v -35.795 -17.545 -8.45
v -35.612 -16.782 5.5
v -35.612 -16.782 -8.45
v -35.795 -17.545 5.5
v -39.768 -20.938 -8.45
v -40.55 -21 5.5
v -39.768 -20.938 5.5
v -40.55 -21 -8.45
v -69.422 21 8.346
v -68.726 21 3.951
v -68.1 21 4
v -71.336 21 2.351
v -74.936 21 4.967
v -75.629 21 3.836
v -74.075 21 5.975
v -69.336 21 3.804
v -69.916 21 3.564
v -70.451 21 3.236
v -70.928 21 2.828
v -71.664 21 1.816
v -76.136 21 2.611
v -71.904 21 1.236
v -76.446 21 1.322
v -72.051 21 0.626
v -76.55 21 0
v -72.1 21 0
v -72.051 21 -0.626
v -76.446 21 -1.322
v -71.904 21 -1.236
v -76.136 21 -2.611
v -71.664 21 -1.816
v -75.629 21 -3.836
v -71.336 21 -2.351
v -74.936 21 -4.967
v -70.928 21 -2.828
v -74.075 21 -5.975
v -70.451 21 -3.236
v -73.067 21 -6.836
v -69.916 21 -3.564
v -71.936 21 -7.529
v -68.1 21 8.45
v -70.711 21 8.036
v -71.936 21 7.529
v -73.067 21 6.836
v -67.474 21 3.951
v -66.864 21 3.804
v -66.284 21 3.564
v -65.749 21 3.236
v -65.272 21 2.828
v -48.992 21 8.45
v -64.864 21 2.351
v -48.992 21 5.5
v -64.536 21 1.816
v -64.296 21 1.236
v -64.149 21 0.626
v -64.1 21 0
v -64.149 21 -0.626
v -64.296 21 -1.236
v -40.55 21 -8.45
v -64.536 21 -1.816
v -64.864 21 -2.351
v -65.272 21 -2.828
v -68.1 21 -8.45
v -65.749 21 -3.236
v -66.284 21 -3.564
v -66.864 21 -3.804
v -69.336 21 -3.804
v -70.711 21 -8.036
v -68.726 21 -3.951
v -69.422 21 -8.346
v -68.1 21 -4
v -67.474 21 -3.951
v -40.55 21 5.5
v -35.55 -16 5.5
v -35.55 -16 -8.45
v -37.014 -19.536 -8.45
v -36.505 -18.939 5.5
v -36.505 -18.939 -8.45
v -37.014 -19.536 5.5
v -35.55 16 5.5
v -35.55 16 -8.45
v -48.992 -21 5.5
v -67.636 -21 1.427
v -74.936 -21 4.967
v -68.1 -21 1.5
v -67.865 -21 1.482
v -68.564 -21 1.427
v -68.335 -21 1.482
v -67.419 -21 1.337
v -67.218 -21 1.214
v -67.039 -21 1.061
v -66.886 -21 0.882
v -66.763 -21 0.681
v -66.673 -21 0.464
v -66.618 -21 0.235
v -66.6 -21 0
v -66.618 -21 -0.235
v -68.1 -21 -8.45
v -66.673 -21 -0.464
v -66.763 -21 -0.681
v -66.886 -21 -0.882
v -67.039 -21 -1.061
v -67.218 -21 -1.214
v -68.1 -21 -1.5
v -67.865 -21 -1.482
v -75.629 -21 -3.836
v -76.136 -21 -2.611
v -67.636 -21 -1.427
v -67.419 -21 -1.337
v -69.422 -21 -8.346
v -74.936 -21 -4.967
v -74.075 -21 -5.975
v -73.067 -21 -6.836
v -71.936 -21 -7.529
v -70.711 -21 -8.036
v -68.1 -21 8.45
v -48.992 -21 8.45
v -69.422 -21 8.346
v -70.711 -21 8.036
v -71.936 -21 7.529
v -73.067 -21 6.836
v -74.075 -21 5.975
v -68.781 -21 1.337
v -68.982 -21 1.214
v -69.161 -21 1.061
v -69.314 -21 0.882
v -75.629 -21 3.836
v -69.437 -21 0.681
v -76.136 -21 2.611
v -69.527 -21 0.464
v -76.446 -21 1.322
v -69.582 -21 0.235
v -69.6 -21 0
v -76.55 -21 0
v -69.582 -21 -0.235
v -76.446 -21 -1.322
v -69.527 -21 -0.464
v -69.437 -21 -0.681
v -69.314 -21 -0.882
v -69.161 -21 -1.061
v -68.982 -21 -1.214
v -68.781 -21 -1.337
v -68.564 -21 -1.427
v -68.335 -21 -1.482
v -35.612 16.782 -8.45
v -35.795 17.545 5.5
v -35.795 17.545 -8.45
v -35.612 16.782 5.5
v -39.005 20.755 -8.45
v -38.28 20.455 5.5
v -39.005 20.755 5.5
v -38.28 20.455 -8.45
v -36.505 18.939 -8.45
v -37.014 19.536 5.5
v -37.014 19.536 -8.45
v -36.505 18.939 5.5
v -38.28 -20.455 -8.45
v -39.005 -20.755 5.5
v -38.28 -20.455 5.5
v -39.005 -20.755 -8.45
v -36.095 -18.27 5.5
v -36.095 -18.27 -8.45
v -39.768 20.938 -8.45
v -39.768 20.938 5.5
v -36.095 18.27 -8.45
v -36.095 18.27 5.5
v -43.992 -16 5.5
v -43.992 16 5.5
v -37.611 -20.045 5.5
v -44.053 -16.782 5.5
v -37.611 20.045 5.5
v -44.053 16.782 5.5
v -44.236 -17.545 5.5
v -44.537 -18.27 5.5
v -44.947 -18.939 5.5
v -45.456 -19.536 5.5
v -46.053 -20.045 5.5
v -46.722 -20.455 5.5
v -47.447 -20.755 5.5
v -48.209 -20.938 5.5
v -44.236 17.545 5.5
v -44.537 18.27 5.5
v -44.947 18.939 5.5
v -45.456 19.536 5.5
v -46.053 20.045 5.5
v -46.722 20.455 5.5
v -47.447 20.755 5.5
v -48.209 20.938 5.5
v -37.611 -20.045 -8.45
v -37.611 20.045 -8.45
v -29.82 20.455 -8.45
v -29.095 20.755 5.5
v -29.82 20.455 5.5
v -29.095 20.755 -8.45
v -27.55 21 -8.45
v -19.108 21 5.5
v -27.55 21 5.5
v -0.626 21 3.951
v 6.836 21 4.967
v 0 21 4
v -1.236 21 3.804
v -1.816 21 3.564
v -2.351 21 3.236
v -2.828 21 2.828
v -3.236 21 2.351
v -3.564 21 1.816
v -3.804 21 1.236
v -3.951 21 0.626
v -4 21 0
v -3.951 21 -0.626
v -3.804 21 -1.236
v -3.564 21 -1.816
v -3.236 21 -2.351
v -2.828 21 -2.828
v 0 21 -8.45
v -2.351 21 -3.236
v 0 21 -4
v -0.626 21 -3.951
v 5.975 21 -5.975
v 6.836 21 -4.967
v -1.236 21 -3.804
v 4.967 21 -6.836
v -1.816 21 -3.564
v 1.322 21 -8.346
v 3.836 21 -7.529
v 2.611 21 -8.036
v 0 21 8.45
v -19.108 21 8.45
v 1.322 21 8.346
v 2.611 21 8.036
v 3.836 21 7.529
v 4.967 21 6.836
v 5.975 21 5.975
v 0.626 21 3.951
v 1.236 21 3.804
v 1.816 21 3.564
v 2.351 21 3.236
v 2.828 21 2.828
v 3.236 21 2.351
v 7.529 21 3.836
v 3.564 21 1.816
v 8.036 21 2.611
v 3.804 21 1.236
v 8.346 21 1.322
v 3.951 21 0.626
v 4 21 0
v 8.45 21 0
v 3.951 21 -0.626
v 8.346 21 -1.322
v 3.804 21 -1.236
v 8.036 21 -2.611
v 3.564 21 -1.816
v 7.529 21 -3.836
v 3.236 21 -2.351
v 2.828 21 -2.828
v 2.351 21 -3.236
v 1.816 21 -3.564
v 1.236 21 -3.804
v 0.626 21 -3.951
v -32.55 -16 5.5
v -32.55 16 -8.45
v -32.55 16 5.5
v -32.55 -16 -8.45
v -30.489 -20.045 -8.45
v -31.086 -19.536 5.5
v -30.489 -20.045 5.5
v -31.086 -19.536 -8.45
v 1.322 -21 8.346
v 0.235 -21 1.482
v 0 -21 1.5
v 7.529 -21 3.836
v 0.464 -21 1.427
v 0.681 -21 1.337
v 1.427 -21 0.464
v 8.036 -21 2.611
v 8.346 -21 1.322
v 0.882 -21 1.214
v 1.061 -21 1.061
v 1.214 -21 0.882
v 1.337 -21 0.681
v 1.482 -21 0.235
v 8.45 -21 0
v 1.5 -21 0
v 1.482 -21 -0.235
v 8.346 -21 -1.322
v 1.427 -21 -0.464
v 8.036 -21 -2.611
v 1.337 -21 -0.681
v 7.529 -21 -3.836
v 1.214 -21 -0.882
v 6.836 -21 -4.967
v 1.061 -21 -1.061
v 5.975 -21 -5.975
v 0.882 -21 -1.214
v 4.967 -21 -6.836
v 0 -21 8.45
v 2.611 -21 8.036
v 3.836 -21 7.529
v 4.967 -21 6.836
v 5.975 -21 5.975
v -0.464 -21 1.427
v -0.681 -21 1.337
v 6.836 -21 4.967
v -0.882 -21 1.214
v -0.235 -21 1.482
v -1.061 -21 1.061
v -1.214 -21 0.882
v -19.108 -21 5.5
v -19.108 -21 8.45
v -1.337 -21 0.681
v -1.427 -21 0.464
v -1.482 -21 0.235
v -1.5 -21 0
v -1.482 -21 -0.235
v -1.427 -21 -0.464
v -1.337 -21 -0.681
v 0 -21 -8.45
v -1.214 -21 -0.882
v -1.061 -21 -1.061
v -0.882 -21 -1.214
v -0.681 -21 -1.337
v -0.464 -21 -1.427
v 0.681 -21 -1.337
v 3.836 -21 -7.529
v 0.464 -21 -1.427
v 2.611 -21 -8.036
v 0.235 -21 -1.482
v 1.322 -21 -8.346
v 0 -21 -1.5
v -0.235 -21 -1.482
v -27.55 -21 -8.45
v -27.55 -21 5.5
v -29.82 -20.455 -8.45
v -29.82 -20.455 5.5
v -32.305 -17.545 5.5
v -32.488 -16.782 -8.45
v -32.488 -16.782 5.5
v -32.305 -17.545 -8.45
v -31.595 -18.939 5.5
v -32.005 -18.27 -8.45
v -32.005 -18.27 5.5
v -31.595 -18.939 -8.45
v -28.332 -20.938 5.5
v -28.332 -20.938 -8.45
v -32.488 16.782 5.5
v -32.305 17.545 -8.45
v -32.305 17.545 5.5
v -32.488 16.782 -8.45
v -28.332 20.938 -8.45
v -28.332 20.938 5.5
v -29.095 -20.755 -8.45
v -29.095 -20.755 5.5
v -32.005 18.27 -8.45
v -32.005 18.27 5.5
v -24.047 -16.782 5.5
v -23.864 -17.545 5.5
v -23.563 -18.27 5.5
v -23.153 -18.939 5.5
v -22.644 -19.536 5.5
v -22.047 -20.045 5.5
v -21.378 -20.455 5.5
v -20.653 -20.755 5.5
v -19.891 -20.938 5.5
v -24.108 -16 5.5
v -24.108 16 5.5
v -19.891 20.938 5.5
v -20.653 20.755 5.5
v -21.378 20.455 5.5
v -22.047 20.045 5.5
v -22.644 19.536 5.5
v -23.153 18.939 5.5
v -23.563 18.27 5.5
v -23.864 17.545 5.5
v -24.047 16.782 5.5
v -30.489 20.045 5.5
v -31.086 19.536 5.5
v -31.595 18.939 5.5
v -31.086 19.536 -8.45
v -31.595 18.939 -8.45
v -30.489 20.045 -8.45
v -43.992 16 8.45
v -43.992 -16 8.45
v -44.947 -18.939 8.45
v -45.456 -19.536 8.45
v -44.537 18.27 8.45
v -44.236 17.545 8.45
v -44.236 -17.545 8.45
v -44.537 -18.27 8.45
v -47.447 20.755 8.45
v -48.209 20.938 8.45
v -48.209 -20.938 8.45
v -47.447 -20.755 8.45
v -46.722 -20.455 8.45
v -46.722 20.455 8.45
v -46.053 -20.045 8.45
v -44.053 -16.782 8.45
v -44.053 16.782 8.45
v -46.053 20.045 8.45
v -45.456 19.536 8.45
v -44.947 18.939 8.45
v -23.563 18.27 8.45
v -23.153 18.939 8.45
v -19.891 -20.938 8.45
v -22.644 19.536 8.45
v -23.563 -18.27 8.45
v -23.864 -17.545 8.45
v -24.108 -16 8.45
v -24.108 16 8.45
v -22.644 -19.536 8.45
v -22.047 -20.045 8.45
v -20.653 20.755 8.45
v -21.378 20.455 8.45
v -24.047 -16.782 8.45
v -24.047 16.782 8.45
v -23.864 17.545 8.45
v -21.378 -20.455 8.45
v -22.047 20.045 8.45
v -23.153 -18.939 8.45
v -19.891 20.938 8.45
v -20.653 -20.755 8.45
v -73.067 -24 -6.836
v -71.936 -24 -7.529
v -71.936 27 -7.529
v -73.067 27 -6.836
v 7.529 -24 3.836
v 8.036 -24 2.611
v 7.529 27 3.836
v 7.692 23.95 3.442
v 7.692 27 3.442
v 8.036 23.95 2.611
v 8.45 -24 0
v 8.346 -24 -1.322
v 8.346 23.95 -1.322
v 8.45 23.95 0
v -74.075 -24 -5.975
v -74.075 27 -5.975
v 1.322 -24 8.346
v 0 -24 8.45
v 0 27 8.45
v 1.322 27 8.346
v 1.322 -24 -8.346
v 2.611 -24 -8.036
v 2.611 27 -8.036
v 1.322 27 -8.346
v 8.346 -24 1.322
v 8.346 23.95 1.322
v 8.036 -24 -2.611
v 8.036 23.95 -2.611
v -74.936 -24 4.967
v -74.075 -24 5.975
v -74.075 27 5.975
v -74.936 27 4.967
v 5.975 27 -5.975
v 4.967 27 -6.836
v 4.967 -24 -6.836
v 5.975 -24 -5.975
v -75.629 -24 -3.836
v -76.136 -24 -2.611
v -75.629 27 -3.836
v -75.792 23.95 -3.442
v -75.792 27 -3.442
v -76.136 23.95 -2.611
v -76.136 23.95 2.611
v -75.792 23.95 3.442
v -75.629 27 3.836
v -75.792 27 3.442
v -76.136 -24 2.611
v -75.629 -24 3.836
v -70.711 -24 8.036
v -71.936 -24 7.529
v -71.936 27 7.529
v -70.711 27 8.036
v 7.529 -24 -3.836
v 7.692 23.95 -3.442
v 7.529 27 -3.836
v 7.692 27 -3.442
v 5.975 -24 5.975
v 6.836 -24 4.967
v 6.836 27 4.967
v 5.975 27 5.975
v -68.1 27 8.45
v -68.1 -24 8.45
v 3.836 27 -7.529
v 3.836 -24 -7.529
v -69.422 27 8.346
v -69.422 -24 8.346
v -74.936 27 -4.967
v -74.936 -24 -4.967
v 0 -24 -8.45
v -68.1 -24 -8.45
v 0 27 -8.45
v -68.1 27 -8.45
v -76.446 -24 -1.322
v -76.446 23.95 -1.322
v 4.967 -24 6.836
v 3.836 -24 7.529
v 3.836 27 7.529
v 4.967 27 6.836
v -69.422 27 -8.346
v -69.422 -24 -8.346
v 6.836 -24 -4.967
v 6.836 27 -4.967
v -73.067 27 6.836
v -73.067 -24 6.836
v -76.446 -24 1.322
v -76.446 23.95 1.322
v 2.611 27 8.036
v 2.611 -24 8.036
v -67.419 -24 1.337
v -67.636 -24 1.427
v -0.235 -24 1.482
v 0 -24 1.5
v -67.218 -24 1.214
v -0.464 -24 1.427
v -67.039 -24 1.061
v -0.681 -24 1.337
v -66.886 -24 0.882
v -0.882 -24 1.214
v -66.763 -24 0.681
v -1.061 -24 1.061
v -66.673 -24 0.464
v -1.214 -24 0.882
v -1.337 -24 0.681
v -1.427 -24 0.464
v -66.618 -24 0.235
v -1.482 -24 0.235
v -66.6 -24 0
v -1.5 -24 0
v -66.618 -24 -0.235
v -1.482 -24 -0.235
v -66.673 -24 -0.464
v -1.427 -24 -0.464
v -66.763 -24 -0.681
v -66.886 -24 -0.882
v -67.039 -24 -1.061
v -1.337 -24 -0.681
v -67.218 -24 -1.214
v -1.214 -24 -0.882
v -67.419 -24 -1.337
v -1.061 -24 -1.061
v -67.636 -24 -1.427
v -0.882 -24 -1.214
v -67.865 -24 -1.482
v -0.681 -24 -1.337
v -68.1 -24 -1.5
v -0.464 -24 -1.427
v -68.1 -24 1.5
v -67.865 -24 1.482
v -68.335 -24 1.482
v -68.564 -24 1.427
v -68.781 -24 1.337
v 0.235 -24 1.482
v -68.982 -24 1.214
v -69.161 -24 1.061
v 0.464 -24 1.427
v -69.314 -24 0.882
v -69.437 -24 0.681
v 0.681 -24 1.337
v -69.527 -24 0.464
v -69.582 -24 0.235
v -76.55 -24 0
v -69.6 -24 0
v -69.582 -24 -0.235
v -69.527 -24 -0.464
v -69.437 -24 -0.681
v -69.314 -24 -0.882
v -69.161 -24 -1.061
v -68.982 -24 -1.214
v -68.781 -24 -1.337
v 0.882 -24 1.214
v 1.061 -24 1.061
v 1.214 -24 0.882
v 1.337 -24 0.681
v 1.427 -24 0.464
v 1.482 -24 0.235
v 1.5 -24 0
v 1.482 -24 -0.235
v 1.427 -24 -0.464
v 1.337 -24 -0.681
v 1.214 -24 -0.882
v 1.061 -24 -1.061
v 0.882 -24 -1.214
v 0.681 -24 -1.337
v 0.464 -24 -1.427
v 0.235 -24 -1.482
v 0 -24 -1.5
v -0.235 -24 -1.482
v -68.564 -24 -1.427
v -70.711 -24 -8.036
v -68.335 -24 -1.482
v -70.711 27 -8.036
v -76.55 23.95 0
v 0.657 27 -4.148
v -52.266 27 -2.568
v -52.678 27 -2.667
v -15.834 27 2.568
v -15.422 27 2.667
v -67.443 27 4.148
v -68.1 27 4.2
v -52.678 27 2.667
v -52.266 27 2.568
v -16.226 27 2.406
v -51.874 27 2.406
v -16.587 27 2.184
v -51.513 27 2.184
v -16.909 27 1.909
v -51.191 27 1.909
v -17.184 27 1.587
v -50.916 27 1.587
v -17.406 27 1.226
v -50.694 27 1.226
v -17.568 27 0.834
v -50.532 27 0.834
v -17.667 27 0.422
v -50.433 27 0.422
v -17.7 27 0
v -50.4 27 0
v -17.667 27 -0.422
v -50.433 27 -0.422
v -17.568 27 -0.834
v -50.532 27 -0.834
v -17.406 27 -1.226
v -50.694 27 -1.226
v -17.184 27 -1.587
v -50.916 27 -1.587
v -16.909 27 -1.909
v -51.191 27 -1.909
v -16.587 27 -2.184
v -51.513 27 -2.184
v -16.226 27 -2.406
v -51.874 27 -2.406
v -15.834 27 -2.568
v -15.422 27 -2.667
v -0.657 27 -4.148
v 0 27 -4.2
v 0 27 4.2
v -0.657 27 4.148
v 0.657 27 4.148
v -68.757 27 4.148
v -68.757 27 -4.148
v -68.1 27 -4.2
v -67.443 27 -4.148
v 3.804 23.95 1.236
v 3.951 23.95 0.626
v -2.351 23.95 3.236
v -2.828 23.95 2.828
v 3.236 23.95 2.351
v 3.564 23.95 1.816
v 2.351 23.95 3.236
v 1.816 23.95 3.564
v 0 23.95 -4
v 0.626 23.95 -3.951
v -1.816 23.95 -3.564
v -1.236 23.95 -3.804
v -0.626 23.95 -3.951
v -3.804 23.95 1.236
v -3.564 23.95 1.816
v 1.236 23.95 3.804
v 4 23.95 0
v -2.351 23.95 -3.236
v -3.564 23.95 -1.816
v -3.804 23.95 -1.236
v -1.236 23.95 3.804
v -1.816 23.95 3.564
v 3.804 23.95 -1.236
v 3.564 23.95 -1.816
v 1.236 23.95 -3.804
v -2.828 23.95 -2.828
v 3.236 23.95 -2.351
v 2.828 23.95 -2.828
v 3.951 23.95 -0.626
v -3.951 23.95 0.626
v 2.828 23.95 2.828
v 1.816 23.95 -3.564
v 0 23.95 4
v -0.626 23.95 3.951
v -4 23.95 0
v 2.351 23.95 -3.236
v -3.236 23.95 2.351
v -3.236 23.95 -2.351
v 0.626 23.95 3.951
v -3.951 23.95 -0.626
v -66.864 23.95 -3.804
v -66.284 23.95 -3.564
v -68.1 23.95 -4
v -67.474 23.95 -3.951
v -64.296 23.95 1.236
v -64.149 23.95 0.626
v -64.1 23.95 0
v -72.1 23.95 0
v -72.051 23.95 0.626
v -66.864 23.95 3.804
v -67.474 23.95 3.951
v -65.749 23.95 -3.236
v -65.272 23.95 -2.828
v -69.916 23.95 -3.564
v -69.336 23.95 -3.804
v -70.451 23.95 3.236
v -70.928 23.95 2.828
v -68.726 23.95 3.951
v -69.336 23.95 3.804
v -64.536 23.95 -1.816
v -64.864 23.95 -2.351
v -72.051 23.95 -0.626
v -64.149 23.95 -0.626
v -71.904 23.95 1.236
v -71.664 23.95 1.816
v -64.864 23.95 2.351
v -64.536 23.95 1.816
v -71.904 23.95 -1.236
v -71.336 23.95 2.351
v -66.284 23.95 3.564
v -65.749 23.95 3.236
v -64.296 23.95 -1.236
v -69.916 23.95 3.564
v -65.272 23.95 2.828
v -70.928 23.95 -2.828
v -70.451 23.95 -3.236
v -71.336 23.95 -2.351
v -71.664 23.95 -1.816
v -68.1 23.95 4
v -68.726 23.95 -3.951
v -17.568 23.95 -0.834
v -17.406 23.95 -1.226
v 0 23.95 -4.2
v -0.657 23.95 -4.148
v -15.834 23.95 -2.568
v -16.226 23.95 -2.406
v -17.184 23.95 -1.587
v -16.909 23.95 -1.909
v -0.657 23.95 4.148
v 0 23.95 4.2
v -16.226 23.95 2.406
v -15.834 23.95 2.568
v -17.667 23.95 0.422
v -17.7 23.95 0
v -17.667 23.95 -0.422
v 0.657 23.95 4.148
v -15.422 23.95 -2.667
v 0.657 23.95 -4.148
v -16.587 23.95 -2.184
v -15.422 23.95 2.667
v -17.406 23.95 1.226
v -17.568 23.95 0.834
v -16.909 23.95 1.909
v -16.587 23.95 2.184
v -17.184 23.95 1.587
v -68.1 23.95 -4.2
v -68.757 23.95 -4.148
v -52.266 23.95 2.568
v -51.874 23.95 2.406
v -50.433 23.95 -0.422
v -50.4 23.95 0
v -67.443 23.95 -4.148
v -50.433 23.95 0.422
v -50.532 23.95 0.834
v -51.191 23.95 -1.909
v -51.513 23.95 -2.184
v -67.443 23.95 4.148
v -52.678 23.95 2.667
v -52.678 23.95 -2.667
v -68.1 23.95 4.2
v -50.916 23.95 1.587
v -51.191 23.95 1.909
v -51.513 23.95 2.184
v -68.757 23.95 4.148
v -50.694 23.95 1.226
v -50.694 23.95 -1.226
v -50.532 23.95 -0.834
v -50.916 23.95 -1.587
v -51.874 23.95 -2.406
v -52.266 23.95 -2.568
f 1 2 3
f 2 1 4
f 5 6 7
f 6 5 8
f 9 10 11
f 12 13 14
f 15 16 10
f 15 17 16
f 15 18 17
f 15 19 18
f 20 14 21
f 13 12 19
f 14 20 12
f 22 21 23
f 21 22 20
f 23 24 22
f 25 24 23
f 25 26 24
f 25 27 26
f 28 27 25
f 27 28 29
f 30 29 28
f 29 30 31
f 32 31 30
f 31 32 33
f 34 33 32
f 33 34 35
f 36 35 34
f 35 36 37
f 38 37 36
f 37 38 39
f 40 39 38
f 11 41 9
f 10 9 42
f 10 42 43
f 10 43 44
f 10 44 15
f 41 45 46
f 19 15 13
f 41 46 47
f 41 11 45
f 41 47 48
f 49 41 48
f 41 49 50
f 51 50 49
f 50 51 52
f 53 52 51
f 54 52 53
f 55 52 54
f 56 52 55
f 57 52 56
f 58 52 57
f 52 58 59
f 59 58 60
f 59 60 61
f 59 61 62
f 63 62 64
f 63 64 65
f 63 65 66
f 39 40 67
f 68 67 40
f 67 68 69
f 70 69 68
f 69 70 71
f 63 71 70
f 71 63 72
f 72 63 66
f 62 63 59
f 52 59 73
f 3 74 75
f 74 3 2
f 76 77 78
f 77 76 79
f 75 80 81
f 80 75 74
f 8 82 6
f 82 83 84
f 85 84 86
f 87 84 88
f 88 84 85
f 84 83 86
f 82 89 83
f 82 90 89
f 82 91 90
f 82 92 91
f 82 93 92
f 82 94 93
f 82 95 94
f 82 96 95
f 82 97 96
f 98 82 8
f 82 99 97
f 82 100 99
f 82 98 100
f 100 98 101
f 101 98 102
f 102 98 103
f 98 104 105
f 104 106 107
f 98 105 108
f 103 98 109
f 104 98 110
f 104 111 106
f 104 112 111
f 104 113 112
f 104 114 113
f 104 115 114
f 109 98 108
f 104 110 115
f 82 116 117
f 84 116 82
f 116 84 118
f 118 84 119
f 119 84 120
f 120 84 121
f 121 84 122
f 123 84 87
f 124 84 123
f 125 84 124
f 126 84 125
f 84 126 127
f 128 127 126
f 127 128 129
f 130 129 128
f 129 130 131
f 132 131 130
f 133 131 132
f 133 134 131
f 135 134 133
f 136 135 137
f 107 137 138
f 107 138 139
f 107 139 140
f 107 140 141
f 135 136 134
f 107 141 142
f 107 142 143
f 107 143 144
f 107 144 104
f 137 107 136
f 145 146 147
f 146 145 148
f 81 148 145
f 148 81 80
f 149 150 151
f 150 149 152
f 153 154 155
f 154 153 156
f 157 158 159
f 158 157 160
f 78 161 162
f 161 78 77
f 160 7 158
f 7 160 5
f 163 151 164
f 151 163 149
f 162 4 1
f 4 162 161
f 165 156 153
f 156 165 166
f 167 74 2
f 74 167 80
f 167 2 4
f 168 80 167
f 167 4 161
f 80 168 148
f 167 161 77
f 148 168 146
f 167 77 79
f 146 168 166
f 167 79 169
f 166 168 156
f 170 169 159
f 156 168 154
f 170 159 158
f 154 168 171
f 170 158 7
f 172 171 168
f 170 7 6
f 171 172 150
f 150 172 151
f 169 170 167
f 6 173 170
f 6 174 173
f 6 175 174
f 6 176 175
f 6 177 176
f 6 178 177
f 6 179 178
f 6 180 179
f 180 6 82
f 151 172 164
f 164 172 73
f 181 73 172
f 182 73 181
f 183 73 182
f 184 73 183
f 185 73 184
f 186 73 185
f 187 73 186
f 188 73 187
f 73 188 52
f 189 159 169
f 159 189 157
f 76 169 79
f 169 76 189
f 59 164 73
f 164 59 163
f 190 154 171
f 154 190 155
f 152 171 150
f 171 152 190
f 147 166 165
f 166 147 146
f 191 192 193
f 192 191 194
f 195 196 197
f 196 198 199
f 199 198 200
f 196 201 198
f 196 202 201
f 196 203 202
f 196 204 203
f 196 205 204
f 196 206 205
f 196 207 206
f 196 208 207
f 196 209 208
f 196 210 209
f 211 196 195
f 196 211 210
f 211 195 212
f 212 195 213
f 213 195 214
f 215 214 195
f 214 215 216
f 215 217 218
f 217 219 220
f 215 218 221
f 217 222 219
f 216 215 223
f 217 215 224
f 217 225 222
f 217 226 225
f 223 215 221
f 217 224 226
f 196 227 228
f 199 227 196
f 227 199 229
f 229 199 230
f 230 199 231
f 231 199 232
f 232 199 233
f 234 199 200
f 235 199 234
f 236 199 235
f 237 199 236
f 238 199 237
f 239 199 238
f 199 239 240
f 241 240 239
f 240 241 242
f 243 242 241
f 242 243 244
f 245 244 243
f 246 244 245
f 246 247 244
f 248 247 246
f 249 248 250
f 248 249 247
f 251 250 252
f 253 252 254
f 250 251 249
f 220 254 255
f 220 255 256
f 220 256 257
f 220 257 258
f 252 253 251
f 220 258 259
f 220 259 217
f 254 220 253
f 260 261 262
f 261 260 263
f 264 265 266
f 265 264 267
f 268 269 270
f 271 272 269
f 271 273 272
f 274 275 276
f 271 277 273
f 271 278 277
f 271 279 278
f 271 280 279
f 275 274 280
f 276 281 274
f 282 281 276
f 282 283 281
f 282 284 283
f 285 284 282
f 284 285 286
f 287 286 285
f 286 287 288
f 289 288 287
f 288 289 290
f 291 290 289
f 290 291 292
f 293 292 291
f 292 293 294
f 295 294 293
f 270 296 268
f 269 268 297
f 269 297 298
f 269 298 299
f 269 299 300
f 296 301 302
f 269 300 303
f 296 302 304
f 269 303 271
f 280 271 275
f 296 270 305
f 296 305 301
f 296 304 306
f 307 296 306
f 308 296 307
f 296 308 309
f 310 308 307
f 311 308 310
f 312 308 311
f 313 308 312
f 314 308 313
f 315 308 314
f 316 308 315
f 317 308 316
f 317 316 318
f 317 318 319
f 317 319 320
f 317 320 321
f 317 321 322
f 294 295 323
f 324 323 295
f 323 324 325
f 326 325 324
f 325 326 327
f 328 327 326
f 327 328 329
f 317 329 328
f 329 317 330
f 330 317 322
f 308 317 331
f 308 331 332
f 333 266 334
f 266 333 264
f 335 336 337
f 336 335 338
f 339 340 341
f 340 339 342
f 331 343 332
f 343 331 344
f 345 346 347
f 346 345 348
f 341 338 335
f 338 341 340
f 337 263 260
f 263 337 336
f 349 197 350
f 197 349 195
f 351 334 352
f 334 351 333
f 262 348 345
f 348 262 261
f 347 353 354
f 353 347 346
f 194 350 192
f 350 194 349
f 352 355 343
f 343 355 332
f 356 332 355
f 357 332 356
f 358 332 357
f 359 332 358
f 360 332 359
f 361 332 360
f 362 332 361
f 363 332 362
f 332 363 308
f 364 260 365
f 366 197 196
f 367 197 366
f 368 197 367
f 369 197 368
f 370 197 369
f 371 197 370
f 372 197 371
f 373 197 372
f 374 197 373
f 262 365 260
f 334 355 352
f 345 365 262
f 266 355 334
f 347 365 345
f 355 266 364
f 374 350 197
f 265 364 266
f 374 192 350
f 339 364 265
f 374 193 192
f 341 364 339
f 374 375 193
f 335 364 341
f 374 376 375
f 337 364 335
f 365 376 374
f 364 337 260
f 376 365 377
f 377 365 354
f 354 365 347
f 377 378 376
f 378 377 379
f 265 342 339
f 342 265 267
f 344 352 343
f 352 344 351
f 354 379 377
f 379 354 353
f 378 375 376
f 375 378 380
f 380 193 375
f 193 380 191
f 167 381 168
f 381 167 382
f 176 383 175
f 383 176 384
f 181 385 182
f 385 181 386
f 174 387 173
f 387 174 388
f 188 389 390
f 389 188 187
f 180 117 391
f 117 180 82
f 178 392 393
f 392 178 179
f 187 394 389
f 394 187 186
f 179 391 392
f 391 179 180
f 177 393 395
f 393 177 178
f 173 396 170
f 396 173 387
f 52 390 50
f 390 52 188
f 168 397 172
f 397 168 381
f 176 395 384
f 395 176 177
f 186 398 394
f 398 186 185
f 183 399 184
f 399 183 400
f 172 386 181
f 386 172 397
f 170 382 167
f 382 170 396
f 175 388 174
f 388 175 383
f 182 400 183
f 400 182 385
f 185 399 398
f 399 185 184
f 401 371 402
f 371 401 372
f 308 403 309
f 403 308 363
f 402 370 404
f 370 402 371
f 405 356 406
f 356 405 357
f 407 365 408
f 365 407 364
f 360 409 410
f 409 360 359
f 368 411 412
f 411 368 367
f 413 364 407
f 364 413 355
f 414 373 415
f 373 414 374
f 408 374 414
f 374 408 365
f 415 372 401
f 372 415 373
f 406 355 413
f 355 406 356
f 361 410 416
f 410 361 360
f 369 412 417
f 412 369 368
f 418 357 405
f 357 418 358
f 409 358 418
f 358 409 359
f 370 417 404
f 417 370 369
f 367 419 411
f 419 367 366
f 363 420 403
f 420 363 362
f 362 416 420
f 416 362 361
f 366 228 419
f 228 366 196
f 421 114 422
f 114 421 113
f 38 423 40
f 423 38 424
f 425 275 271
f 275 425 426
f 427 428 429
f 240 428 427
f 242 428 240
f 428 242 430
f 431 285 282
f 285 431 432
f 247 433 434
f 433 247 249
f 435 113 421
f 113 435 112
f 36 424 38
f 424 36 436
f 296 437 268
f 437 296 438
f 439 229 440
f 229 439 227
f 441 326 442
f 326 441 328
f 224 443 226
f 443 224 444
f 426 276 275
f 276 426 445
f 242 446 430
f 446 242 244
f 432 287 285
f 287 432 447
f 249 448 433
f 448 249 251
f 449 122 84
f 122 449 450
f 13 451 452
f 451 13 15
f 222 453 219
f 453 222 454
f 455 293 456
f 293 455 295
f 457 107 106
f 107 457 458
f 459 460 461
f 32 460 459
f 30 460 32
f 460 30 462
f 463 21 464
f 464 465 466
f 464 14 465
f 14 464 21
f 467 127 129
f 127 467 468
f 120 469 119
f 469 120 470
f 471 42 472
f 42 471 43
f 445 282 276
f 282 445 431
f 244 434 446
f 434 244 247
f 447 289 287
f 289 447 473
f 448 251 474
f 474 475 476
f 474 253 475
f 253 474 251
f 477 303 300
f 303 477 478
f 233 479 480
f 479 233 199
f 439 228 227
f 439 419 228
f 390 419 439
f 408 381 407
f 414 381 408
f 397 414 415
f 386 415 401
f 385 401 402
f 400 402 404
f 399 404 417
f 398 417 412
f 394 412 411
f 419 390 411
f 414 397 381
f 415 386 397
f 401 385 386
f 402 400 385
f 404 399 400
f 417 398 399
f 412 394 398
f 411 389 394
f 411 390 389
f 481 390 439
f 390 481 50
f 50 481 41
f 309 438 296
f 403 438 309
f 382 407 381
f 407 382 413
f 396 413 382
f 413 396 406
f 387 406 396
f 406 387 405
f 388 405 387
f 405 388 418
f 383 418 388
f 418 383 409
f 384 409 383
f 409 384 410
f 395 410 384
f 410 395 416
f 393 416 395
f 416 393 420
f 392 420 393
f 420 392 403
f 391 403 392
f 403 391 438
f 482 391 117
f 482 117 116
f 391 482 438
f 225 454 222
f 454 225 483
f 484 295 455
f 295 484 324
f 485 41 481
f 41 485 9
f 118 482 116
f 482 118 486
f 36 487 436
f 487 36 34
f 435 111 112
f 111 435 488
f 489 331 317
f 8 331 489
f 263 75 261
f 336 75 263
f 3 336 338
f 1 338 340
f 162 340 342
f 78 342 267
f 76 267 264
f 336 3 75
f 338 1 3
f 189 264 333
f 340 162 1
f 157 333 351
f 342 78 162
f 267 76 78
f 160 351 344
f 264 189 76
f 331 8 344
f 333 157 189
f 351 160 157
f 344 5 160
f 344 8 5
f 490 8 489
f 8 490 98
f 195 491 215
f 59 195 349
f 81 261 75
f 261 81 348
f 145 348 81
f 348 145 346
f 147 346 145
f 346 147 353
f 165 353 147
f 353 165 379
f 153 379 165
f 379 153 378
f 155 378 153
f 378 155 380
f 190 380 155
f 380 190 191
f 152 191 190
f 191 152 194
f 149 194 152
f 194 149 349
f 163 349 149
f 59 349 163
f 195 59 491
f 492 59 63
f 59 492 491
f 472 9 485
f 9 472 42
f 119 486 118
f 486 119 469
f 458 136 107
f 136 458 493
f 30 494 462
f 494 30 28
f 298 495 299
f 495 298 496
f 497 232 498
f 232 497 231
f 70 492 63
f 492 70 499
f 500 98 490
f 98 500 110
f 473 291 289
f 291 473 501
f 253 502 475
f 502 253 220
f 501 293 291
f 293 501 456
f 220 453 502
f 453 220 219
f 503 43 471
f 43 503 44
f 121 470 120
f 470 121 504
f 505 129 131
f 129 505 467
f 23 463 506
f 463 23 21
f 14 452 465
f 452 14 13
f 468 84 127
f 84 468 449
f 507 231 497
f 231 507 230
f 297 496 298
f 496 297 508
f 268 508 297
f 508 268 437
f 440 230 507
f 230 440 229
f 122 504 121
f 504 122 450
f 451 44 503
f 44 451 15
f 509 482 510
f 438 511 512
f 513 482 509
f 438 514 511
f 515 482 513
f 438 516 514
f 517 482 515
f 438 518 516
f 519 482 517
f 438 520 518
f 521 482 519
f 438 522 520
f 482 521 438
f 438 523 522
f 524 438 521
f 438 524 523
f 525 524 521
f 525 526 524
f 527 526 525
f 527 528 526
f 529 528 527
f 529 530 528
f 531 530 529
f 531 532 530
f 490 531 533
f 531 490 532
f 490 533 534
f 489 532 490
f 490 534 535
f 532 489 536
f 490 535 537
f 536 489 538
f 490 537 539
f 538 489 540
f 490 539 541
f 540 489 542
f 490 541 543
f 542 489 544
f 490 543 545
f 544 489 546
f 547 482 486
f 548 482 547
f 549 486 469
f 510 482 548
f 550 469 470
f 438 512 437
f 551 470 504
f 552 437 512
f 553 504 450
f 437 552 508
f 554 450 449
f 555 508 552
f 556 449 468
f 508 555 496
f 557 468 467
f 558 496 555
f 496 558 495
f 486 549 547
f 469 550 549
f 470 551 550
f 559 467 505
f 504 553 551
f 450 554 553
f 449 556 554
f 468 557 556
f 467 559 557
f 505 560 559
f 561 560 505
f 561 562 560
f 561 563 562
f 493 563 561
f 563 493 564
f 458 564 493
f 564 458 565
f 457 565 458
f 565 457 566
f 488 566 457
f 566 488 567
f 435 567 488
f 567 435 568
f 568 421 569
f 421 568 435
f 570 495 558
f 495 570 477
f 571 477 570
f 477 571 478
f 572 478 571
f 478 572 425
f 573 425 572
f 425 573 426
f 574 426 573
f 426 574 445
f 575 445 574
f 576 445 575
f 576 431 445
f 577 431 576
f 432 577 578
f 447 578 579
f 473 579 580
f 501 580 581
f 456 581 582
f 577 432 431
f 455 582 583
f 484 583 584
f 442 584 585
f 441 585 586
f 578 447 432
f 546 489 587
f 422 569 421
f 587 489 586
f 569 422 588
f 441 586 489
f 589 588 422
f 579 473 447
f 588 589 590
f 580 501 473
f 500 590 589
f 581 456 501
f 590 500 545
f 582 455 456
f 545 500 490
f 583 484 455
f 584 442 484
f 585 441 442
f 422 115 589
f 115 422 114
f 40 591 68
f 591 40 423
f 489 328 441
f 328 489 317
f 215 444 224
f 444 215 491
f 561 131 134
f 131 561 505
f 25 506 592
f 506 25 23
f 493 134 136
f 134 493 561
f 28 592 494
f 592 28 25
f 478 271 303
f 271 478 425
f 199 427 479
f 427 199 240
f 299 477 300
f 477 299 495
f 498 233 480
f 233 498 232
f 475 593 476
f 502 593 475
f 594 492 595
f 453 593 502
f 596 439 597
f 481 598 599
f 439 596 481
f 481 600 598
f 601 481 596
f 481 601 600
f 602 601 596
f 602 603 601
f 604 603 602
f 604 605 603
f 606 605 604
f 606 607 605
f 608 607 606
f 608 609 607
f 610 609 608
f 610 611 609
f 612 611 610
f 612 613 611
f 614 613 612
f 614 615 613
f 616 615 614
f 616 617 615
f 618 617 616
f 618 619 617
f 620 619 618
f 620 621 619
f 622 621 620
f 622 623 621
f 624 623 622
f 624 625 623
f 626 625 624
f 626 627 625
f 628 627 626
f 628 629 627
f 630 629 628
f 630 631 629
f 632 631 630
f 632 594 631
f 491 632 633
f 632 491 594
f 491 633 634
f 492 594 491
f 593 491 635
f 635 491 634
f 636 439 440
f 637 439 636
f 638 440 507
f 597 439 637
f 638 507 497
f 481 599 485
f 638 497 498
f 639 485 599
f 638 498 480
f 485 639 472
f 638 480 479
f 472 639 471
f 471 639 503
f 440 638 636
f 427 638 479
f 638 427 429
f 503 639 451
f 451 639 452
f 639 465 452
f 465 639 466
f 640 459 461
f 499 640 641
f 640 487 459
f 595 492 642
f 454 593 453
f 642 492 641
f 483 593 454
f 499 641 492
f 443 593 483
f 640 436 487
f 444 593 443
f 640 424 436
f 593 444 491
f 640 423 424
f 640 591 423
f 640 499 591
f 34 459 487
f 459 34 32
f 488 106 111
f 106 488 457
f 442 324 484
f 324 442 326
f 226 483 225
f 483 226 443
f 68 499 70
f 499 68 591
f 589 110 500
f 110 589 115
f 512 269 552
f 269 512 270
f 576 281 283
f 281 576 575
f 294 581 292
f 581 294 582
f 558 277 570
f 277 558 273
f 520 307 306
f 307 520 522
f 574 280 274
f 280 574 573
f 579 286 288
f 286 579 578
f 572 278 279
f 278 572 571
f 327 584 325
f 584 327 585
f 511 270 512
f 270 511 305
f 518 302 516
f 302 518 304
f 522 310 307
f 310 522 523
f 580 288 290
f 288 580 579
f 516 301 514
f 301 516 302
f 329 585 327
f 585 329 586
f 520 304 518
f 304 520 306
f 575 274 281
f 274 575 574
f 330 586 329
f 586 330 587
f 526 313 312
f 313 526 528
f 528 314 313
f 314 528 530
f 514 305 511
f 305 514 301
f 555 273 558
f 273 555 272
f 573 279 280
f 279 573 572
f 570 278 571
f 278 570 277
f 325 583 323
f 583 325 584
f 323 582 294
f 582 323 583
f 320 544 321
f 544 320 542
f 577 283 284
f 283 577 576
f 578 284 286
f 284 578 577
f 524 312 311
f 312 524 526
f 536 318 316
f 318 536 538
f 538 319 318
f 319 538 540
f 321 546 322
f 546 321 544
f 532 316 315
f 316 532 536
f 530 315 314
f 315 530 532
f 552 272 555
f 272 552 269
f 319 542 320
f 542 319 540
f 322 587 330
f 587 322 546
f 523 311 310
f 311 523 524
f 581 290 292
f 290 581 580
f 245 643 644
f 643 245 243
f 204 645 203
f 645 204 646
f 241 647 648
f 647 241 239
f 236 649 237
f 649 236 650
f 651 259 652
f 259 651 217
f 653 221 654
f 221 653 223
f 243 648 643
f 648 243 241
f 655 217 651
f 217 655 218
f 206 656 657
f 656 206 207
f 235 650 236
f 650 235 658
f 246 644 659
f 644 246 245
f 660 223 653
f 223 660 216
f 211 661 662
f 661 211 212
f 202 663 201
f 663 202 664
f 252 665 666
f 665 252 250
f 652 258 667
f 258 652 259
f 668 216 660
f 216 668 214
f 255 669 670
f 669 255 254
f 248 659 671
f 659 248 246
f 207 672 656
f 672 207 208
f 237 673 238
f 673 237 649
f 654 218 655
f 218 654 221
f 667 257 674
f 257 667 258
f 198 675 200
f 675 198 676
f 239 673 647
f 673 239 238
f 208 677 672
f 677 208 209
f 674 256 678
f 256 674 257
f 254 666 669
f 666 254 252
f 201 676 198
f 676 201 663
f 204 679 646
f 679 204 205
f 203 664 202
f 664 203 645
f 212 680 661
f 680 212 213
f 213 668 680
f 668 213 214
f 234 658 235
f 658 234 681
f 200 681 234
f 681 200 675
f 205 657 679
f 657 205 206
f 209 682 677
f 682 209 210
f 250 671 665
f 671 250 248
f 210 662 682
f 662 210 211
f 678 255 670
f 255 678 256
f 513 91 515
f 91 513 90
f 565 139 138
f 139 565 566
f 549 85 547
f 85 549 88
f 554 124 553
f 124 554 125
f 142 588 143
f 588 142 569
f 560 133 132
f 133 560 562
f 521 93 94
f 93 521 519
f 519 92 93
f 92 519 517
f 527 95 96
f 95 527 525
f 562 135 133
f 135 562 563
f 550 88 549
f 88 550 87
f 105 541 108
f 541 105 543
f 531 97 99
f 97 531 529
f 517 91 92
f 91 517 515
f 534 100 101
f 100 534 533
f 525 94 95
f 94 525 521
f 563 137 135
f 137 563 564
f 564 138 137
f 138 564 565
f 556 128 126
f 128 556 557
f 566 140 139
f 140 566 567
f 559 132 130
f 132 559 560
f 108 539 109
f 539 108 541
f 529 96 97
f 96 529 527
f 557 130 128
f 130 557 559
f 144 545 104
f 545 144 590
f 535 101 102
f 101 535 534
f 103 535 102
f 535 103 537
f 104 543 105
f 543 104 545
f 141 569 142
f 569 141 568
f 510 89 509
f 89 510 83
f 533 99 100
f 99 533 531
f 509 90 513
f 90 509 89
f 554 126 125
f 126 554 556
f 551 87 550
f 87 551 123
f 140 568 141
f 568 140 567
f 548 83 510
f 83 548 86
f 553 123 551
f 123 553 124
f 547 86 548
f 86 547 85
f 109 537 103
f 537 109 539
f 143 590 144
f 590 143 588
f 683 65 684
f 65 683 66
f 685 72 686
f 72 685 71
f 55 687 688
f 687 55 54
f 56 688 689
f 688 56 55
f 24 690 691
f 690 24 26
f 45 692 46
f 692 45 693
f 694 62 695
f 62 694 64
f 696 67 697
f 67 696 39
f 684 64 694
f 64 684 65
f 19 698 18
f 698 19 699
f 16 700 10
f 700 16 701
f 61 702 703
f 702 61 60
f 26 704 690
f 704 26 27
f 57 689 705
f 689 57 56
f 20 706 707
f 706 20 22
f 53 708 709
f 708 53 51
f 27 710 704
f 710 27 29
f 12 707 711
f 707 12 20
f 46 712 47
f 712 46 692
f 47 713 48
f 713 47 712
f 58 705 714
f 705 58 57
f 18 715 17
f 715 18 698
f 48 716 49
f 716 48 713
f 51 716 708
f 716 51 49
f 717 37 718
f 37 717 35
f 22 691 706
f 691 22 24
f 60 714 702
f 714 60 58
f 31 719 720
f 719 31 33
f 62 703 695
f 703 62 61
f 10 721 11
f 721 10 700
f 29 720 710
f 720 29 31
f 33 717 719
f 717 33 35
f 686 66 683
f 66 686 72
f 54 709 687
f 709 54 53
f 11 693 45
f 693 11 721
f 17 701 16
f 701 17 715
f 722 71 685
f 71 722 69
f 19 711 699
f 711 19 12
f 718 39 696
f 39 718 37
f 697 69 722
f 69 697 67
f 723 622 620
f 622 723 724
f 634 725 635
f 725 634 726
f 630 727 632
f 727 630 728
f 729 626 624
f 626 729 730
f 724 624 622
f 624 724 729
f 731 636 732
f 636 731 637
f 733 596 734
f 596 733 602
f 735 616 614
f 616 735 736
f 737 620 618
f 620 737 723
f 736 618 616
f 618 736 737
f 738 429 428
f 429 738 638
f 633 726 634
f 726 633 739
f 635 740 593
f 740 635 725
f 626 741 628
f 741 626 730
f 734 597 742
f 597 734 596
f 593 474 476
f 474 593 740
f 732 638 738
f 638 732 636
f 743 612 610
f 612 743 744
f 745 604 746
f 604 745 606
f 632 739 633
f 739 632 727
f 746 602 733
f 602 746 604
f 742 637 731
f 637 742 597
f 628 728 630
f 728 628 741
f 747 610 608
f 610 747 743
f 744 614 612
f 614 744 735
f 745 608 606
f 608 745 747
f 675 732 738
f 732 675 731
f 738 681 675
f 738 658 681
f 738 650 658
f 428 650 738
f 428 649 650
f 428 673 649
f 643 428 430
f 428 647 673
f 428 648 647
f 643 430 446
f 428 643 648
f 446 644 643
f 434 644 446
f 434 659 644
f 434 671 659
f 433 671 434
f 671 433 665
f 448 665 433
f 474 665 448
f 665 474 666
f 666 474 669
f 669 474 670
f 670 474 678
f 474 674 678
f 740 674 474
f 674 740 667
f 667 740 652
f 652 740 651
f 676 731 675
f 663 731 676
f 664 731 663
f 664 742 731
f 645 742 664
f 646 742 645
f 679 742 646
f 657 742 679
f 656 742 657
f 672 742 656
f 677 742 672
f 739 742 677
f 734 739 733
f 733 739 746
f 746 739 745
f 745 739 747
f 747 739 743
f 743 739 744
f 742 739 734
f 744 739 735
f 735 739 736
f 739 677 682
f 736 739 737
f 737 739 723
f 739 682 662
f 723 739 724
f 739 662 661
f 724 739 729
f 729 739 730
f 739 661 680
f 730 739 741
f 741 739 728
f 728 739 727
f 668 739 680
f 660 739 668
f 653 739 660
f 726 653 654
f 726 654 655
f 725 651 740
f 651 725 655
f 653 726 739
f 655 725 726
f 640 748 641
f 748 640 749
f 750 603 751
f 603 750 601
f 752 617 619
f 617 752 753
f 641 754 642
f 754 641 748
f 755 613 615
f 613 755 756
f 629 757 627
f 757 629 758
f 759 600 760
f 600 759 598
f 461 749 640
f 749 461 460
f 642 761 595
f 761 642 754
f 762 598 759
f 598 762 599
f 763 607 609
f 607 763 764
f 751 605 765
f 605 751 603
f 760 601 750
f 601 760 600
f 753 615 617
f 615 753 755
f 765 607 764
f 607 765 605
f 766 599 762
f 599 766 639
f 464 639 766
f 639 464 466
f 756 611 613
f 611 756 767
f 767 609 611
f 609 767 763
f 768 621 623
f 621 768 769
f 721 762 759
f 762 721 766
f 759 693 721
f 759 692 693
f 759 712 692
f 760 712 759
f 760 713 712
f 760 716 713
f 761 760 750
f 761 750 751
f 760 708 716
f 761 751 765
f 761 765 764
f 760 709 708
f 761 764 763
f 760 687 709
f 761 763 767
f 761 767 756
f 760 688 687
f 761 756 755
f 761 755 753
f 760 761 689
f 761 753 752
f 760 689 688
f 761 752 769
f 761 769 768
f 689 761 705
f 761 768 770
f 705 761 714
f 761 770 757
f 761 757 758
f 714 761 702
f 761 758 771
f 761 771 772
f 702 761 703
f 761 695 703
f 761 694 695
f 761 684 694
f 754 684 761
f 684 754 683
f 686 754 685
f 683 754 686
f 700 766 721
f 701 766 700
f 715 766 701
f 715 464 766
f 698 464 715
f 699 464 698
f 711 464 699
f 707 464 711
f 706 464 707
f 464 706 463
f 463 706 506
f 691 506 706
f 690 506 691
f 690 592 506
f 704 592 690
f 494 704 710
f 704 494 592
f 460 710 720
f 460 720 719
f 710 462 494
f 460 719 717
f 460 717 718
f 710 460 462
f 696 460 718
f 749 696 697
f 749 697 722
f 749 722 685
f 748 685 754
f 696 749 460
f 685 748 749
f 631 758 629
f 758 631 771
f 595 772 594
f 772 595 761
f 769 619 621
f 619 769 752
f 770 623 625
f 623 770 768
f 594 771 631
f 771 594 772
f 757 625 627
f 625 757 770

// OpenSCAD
// file: utils.scad
m3Radius = 3.0/2;
m3CskTopRadius = 6.0/2;
m3CskHeadHeight = 2.0;
m8Radius = 8.0/2;

// TODO - This should take a vector, and a "center" option so it can be easily re-used
module roundedCube(_x,_y,_z,_r) {
	hull() {
		for(xPos = [-(_x/2-_r),(_x/2-_r)]) {
			for(yPos = [-(_y/2-_r),(_y/2-_r)]) {
				translate([xPos, yPos, -_z/2]) cylinder(h=_z,r=_r);
			}
		}
	}
}

// TODO - Test that this results in correctly sized bolt
module m3CskBolt(length) {
	# union() {
	// Countersunk section // TODO - how tall is the countersunk section
		translate([0,0,m3CskHeadHeight / 2]) cylinder(h=m3CskHeadHeight, r1=m3CskTopRadius, r2=m3Radius, center=true);
		translate([0,0,m3CskHeadHeight / 2 + length / 2]) cylinder(h=length, r=m3Radius, center=true);
	}
}
// file: MiniServo.scad
$fn=40;

// All dimensions in mm

// Overall dimensions of servo (excluding mounting tabs and axle shroud
servoHeight = 32.0;
servoWidth = 35.0;
servoDepth = 16.9;

// Additional dimensions for mounting tabs
mountingTabWidth = 50.8;
mountingTabHeight = 3.5;

// Axle shroud dimensions
axleShroudHeight = 3.0;
axleShroudDiameter = servoDepth;
// Align outside of shroud with main body of servo
axleXOffset = servoWidth / 2 - axleShroudDiameter / 2;

// Axle dimensions
axleDiameter = 6.0;
axleHeight = 4.0;  // Above Shroud

gearShroudXOffset = axleXOffset - 10.0;
gearShroudDiameter = 8.0;

// Rectangular pockets for mounting holes
mountingHolePocketWidth = 7.7;
mountingHolePocketDepth = 6.6;
mountingHolePocketHeight = 1.0;

// Gap between outer edge and pockets
mountingHolePocketInset = 1.3;

mhX = mountingTabWidth / 2 - mountingHolePocketWidth / 2;
mhY = servoDepth / 2 - mountingHolePocketDepth / 2 - mountingHolePocketInset;

mountingHoleDiameter = 4.0;
mountingHoleCutoutWidth = 2.0;

function signum(x) = (x < 0)?-1:(x > 0)?1:0;

module servoBody() {
  union() {
	  // The main body of the servo
		cube([servoWidth, servoHeight, servoDepth], center=true);
		
		// The mounting tabs either side
		translate([0, servoHeight / 2 - mountingTabHeight / 2, 0]) {
			cube([mountingTabWidth, mountingTabHeight, servoDepth], center=true);
		}
	}
}

module axleAndGearShroud(height, yOffset) {
	union() {
		translate([-axleXOffset, yOffset + height / 2, 0]){
			rotate([90,0,0]) {
				cylinder(height, axleShroudDiameter/2, axleShroudDiameter/2,center=true);
			}
		}
		translate([-gearShroudXOffset, yOffset+ height / 2, 0]){
			union() {
				rotate([90,0,0]) {
					cylinder(height, gearShroudDiameter/2, gearShroudDiameter/2,center=true);
				}
				translate([-gearShroudDiameter/2,0,0]) cube([gearShroudDiameter, height, gearShroudDiameter], center=true);
			}
		}
	}
}

module axle() {
  translate([-axleXOffset, servoHeight / 2 + axleShroudHeight + axleHeight / 2, 0]){
		rotate([90,0,0]) {
			cylinder(axleHeight, axleDiameter/2, axleDiameter/2,center=true);
		}
	}
}

module mountingDetail() {
	for(x = [-mhX, mhX]) {
		for(z = [-mhY, mhY]) {
			translate([x, servoHeight / 2 - mountingHolePocketHeight / 2, z]) {
				union() {
					// Rectangular pocket
					cube([mountingHolePocketWidth, mountingHolePocketHeight, mountingHolePocketDepth], center=true);

					// Actual mounting hole
					rotate([90,0,0]) cylinder(mountingTabHeight * 2, mountingHoleDiameter / 2, mountingHoleDiameter / 2, center=true);

					// Cutout to edge
					translate([signum(x) * mountingHolePocketWidth / 2, 0, 0]) cube([mountingHolePocketWidth, mountingTabHeight * 2,mountingHoleCutoutWidth], center=true);
				}
			}
		}
	}
}

module mountingBoltHoles(height, yOffset, radius) {
	for(x = [-mhX, mhX]) {
		for(z = [-mhY, mhY]) {
			translate([x, yOffset, z]) {
					// Actual mounting hole
					rotate([90,0,0]) cylinder(height, r=radius, center=true);
			}
		}
	}
}

// Main routine
module MiniServo() {
	difference() {
		union() {
			servoBody();
			axleAndGearShroud(axleShroudHeight, servoHeight / 2);
			axle();
		}

		union() {
			mountingDetail();
			mountingBoltHoles(mountingTabHeight * 2, servoHeight / 2 - mountingHolePocketHeight / 2, mountingHoleDiameter / 2);
		}
	}
}

//MiniServo();
// file: Shin.scad
include <MiniServo.scad>
include <utils.scad>

$fn=40;

// All dimensions in mm
wallThickness = 3;
wallThicknessEitherSide = 2 * wallThickness;

innerSizeTolerance = 0.4;
differencePadding = 0.1;

shinTopLength = mountingTabWidth + wallThicknessEitherSide;
shinBottomLength = 65;

footRadius = 5;
footCutoutOffset = 20;
footCutoutTopOffset = 5;
footCutoutBottomRadius = 3;

filletRadius = 2;

cutoutHeight = servoDepth + wallThicknessEitherSide + differencePadding;

module axleGearShroud() {
	union() {
		axleShroud();
		gearShroud();
	}
}

// Hole opposite axle that will be used for a pin that the thigh will rotate on

module cutoutAxleExtensionHole() {
	translate([-axleXOffset, -(servoHeight / 2), 0]){
		rotate([90,0,0]) {
			m3CskBolt(8);
		}
	}
}

module cutoutCableExtensionHole() {
	translate([-(shinTopLength / 2 - wallThickness / 2), 0, 0]) 
		rotate([0,90,0])
			roundedCube(12, 3, (wallThickness + differencePadding), 1);
}

// Main Shin Top section
module shinTopSection() {
	union() {
		difference(){
			// Main cube to carve from
			cube([shinTopLength,
					servoHeight + wallThicknessEitherSide, 
					servoDepth + wallThicknessEitherSide], center=true);

			// Cut out inner material to leave space for servo
			translate([0, 0, wallThickness / 2]) roundedCube(shinTopLength + innerSizeTolerance - wallThicknessEitherSide, servoHeight + innerSizeTolerance, servoDepth + innerSizeTolerance + wallThickness, 2);

			// Cutouts in base to minimise material required
			for(xPos = [-shinTopLength / 4, shinTopLength / 4]) {
				translate([xPos, 0, -(servoDepth + wallThickness) / 2]) 
					roundedCube(shinTopLength / 3, servoHeight - wallThickness, wallThickness + differencePadding, filletRadius);
			}

			// Cutout slot for Axle and Gear Shroud 
			hull() {
				translate([0,0,(servoDepth + wallThicknessEitherSide) / 2]) axleAndGearShroud(wallThickness + differencePadding * 2, servoHeight / 2 - differencePadding);
				axleAndGearShroud(wallThickness + differencePadding * 2, servoHeight / 2 - differencePadding);
			}

			// Cutout bolt holes
			mountingBoltHoles(wallThickness + differencePadding, servoHeight / 2 + wallThickness / 2, m3Radius);

			// Cutout bolt hole for pin opposite axle
			cutoutAxleExtensionHole();

			// Hole on top face for servo cable
			cutoutCableExtensionHole();
		}
	}
}

// Shin bottom section down to foot
module shinBottomSection() {
	difference() {

	  // Shin Tapered section down to foot.
		hull() {
			translate([shinTopLength / 2, 0, 0]) {
				cube([wallThickness, servoHeight + wallThicknessEitherSide, servoDepth + wallThicknessEitherSide], center=true);
			}
			translate([shinTopLength / 2 + shinBottomLength, 0, -(servoDepth + wallThicknessEitherSide) / 2 + footRadius]) {
				rotate([0,90,0]) cylinder(h=wallThickness, r=footRadius, center=true);
			}
		}

		// Hollow out the inside
		hull() {
			translate([shinTopLength / 2, 0, 0]) {
				cube([wallThickness + differencePadding, servoHeight, servoDepth], center=true);
			}

			// TODO - Cutout should be inside foot, so foot base is wallThickness.
			// TODO - Should include a hole for mounting a rubber foot
			translate([shinTopLength / 2 + shinBottomLength, 0, -(servoDepth + wallThicknessEitherSide) / 2 + footRadius]) {
				rotate([0,90,0]) cylinder(h=wallThickness + differencePadding, r=(footRadius - wallThickness), center=true);
			}
		}

		// Shin cutout created from hull of 3 cylinders
		hull() {
			translate([shinTopLength / 2 + shinBottomLength - footCutoutOffset, 0, 0])
				cylinder(h=cutoutHeight, r=footCutoutBottomRadius, center=true);

			for(ySide = [-1,1]) {
				translate([shinTopLength / 2 + footCutoutTopOffset, ySide * (servoHeight / 2 - 2 * wallThickness), 0]) 
				cylinder(h=cutoutHeight, r=filletRadius, center=true);
			}
		}
	}
}

module shin() {
	union() {
		shinTopSection();
		shinBottomSection();
	}
}

//% MiniServo();

// shin();
// main file
include <Shin.scad>

shinWidthClearance = 42.0; // Measured from top of axle shroud to outer surface of shin (with space for m3 washer on axle pin)

thighLength = 85.0;
// TODO - Build up from Shin dimensions + gap + wallThickness
thighWidth = shinWidthClearance + 3 * wallThickness; 
thighDepth = axleShroudDiameter;

servoBarSpacing = 0.2;

module thigh() {
// TODO - define all modules relative to center, and offset at the end
	difference() {
		thighMainBlock();
		thighMainCutout();
		thighTopCutouts();
		axleHole(0, -thighWidth / 2 + wallThickness, m3Radius);
		axleHole(0, thighWidth / 2 - wallThickness, m8Radius);
		# axleHole(-(thighLength - axleShroudDiameter), -thighWidth / 2 + wallThickness , m3Radius);
		axleHole(-(thighLength - axleShroudDiameter), thighWidth / 2 - wallThickness, m8Radius);

		cutoutServoSlot(0);
		cutoutServoSlot(-thighLength + axleShroudDiameter);
	}
}

module thighMainBlock() {
// Construct main block as hull around two cylinders either end of the part
	hull() {
		for(x = [0, -thighLength+axleShroudDiameter]) {
			translate([x, wallThickness / 2,0]) 
			  rotate([90,0,0]) 
				  cylinder(h=(shinWidthClearance + 3 * wallThickness), r=(axleShroudDiameter / 2), center=true);
		}
	}
}

module thighMainCutout() {
	translate([-thighLength / 2 + axleShroudDiameter / 2, 0, -wallThickness]) {
		// Cutout most of the bottom, but leave a supporting strut
		union() {
			for(x = [-1,1]) {
				translate([x*(thighLength / 2 + wallThickness / 2), 0, 0]) {
					roundedCube(thighLength, shinWidthClearance, thighDepth + differencePadding, 5);
				}
			}
		}
	}
}

module cutoutServoSlot(xOffset) {
	# translate([xOffset, thighWidth / 2, 0])
		rotate([90,0,0]) {
			hull() {
				cylinder(h=wallThickness + differencePadding, r=4.0 + servoBarSpacing, center=true);
				translate([-15,0,0]) cylinder(h=wallThickness + differencePadding, r=2.5 + servoBarSpacing, center=true);
				translate([15,0,0]) cylinder(h=wallThickness + differencePadding, r=2.5 + servoBarSpacing, center=true);
			}
		}
}

module axleHole(xOffset, yOffset, radius) {
	// TODO - Update to appropriate radii either side
	translate([xOffset, yOffset, 0])
		rotate([90,0,0])
			# cylinder(h=(wallThickness + differencePadding), r=radius, center=true);
}

module thighTopCutouts() {
	for(x=[-(thighLength / 3), (thighLength / 3)]) {
		translate([x - (thighLength / 2 - axleShroudDiameter /2), 0, thighDepth / 2 - wallThickness / 2])
			roundedCube((thighLength / 3 + axleShroudDiameter / 2), thighWidth - 3 * wallThickness, wallThickness + differencePadding, 5);
	}
}

thigh();

% rotate([0,0,0]) translate([axleXOffset,0,0]) shin();
